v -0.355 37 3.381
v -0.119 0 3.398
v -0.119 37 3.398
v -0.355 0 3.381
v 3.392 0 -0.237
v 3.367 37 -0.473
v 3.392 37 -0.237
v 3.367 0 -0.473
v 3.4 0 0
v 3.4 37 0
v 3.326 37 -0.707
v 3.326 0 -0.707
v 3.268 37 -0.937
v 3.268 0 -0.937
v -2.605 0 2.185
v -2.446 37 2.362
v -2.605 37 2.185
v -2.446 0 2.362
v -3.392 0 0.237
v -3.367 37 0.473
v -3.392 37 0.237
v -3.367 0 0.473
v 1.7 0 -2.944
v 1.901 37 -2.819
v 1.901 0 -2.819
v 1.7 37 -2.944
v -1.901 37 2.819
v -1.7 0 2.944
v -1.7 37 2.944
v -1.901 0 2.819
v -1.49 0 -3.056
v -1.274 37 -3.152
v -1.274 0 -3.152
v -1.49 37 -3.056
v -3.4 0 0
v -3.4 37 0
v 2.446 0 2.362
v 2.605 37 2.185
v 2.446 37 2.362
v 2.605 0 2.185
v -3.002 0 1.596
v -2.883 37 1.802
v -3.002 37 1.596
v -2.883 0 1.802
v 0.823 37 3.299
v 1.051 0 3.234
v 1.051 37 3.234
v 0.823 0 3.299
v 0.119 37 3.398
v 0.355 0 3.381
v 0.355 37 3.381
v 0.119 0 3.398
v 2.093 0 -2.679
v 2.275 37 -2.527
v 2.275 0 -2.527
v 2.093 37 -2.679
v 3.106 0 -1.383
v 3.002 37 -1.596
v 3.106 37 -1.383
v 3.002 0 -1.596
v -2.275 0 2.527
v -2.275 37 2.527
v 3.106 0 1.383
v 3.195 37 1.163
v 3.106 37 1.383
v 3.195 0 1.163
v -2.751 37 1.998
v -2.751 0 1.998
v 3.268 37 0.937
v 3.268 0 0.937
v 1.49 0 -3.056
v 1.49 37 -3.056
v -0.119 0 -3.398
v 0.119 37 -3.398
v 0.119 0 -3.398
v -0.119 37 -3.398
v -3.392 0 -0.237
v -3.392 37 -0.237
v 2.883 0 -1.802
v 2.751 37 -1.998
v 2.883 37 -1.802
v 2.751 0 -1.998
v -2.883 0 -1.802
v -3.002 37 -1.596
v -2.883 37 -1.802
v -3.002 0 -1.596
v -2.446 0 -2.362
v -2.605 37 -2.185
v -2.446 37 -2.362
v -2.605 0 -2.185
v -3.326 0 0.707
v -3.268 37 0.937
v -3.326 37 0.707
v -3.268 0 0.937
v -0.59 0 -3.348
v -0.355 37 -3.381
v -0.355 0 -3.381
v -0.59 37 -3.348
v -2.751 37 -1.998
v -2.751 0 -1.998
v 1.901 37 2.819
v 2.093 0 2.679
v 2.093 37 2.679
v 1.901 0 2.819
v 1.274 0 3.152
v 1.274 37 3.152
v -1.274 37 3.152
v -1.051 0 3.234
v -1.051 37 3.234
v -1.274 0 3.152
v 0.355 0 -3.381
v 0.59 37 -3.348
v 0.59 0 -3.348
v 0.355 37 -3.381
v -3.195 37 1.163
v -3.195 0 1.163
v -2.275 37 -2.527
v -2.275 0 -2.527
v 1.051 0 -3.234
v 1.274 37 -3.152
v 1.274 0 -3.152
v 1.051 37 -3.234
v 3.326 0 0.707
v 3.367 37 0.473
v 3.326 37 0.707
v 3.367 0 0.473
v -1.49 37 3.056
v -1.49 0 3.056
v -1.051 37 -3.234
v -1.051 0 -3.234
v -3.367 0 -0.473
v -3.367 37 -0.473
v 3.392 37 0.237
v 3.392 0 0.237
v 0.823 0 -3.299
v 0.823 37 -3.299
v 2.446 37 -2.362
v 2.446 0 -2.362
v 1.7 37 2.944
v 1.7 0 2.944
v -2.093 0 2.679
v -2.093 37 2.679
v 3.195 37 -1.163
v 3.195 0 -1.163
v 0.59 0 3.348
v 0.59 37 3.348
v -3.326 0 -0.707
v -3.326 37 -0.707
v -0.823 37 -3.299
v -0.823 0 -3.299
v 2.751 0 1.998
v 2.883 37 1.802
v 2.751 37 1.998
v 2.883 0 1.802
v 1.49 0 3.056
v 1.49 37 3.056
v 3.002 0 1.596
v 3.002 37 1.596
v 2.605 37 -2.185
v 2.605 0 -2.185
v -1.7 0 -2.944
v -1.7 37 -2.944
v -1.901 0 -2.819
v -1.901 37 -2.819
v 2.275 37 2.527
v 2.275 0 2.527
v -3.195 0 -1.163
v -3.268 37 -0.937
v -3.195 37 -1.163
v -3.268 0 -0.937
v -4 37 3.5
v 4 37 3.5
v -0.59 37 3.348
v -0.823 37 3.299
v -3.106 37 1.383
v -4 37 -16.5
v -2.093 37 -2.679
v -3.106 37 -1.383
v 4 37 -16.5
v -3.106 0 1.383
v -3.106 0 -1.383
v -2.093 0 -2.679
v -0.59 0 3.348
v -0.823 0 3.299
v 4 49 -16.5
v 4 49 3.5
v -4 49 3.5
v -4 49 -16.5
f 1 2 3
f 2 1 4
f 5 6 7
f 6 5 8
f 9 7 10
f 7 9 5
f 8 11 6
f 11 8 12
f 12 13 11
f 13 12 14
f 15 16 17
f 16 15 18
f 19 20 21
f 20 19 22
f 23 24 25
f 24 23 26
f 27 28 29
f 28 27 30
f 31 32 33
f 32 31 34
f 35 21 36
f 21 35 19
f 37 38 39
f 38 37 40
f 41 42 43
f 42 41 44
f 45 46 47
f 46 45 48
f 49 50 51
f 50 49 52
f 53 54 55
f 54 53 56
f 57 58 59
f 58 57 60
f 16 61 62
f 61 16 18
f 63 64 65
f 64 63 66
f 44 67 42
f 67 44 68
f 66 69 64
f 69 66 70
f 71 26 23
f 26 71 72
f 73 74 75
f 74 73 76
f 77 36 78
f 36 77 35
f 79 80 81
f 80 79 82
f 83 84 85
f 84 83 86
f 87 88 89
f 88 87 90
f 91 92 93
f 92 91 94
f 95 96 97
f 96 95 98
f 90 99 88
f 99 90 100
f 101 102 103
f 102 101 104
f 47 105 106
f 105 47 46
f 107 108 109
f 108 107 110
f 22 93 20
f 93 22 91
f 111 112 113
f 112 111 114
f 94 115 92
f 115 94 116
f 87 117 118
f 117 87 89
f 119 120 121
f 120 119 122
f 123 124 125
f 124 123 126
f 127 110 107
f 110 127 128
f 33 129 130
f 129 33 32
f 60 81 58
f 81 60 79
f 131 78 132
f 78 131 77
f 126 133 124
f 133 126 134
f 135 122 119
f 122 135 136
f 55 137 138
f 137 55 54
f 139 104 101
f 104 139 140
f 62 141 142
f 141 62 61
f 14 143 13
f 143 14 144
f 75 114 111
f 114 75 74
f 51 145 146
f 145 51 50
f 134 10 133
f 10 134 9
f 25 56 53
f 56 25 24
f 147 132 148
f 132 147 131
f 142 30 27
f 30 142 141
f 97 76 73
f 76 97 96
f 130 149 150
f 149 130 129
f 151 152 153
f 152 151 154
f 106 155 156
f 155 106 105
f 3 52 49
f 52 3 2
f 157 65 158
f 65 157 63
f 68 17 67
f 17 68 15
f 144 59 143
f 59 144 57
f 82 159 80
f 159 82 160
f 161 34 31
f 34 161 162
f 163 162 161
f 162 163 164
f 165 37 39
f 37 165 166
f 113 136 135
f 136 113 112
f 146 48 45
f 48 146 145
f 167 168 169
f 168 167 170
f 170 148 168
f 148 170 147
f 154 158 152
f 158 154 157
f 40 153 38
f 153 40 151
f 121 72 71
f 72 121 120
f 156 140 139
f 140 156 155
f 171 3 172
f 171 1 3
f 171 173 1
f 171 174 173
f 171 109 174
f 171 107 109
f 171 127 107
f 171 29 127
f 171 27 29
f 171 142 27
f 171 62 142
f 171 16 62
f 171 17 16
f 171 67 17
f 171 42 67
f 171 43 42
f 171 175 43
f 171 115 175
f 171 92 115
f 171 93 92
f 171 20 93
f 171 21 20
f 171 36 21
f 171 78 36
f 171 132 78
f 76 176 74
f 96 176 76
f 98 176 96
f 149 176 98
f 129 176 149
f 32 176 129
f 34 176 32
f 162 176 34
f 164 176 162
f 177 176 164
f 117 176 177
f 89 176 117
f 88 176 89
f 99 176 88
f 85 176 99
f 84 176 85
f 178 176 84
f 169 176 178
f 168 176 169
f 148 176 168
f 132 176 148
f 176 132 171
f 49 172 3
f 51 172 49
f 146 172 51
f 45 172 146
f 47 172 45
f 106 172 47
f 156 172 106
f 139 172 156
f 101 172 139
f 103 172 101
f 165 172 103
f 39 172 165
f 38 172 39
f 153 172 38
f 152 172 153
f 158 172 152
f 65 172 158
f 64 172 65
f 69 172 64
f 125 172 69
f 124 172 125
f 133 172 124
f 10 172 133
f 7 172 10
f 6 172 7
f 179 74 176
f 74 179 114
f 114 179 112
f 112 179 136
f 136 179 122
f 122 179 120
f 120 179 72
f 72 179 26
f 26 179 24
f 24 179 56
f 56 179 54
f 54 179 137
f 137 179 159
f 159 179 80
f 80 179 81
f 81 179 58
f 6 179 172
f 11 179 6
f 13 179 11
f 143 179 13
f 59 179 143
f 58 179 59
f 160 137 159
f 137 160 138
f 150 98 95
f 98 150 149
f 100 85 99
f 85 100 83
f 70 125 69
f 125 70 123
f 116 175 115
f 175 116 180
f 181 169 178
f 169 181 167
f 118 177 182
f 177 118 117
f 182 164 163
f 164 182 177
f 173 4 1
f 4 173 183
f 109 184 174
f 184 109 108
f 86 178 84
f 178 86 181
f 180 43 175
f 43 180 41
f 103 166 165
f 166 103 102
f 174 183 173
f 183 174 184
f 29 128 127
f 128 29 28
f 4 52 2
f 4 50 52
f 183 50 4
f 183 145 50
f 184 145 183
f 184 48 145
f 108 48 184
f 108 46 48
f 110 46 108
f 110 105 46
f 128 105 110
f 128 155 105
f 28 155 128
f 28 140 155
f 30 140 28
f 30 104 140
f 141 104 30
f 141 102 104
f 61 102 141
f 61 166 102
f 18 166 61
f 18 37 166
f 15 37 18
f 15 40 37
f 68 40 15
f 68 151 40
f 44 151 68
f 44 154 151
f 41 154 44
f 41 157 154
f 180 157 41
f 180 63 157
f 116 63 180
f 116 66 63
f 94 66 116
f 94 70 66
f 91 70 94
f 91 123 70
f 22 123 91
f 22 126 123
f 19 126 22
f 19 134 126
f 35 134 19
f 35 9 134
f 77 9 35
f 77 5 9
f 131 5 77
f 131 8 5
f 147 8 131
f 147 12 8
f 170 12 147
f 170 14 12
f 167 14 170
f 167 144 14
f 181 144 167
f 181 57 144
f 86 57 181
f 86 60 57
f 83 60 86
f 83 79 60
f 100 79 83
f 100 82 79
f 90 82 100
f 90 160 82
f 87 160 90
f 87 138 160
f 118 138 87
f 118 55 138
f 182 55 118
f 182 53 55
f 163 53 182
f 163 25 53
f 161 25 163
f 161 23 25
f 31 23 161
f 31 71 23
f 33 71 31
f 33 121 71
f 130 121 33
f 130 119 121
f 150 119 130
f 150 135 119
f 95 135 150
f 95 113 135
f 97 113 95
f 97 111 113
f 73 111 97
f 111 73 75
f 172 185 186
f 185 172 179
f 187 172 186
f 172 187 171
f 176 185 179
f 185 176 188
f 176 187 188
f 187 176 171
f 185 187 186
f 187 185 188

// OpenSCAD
pinDia = 7;
pinLength = 37;
blockHeight = 20;
blockLength = 12;
blockWidth = 8;
tollerance = 0.2;
skidHeight = 50;
skidWidth = 3;
skidLength = 100;
skidAngle = 12;
//skidOffset = 20; =skidAngle!!!

//shorten
t = tollerance;
pd = pinDia;
pl = pinLength;
bh = blockHeight;
bl = blockLength;
bw = blockWidth;
sh = skidHeight;
sw = skidWidth;
sl = skidLength;
sa = skidAngle;
so = skidAngle;

$fn = 90;

module skidEnd(){
    circle(r=sh,h=sw);
}
//pin
rotate([270,0,0]){
    cylinder(d=pinDia-t , h=pinLength);
}
//block
translate([-bw/2,pl,-bh+pd/2]){
    cube([bw,bl,bh]);
}
//skid
translate([-bw/2,pl,-bh+pd/2]){
    translate([bw/2,bl/2,-sh+10]){
        rotate([0,90+sa,0]){
            translate([0,0,-so]){
                hull(){
                    translate([0,sl/2,0]){
                        skidEnd();
                    }
                    translate([0,-sl/2,0]){
                        skidEnd();
                    }
                }
            }
        }
        rotate([0,90-sa,0]){
            translate([0,0,so]){
                hull(){
                    translate([0,sl/2,so]){
                        skidEnd();
                    }
                    translate([0,-sl/2,so]){
                        skidEnd();
                    }
                }
            }
        }
    }
}
